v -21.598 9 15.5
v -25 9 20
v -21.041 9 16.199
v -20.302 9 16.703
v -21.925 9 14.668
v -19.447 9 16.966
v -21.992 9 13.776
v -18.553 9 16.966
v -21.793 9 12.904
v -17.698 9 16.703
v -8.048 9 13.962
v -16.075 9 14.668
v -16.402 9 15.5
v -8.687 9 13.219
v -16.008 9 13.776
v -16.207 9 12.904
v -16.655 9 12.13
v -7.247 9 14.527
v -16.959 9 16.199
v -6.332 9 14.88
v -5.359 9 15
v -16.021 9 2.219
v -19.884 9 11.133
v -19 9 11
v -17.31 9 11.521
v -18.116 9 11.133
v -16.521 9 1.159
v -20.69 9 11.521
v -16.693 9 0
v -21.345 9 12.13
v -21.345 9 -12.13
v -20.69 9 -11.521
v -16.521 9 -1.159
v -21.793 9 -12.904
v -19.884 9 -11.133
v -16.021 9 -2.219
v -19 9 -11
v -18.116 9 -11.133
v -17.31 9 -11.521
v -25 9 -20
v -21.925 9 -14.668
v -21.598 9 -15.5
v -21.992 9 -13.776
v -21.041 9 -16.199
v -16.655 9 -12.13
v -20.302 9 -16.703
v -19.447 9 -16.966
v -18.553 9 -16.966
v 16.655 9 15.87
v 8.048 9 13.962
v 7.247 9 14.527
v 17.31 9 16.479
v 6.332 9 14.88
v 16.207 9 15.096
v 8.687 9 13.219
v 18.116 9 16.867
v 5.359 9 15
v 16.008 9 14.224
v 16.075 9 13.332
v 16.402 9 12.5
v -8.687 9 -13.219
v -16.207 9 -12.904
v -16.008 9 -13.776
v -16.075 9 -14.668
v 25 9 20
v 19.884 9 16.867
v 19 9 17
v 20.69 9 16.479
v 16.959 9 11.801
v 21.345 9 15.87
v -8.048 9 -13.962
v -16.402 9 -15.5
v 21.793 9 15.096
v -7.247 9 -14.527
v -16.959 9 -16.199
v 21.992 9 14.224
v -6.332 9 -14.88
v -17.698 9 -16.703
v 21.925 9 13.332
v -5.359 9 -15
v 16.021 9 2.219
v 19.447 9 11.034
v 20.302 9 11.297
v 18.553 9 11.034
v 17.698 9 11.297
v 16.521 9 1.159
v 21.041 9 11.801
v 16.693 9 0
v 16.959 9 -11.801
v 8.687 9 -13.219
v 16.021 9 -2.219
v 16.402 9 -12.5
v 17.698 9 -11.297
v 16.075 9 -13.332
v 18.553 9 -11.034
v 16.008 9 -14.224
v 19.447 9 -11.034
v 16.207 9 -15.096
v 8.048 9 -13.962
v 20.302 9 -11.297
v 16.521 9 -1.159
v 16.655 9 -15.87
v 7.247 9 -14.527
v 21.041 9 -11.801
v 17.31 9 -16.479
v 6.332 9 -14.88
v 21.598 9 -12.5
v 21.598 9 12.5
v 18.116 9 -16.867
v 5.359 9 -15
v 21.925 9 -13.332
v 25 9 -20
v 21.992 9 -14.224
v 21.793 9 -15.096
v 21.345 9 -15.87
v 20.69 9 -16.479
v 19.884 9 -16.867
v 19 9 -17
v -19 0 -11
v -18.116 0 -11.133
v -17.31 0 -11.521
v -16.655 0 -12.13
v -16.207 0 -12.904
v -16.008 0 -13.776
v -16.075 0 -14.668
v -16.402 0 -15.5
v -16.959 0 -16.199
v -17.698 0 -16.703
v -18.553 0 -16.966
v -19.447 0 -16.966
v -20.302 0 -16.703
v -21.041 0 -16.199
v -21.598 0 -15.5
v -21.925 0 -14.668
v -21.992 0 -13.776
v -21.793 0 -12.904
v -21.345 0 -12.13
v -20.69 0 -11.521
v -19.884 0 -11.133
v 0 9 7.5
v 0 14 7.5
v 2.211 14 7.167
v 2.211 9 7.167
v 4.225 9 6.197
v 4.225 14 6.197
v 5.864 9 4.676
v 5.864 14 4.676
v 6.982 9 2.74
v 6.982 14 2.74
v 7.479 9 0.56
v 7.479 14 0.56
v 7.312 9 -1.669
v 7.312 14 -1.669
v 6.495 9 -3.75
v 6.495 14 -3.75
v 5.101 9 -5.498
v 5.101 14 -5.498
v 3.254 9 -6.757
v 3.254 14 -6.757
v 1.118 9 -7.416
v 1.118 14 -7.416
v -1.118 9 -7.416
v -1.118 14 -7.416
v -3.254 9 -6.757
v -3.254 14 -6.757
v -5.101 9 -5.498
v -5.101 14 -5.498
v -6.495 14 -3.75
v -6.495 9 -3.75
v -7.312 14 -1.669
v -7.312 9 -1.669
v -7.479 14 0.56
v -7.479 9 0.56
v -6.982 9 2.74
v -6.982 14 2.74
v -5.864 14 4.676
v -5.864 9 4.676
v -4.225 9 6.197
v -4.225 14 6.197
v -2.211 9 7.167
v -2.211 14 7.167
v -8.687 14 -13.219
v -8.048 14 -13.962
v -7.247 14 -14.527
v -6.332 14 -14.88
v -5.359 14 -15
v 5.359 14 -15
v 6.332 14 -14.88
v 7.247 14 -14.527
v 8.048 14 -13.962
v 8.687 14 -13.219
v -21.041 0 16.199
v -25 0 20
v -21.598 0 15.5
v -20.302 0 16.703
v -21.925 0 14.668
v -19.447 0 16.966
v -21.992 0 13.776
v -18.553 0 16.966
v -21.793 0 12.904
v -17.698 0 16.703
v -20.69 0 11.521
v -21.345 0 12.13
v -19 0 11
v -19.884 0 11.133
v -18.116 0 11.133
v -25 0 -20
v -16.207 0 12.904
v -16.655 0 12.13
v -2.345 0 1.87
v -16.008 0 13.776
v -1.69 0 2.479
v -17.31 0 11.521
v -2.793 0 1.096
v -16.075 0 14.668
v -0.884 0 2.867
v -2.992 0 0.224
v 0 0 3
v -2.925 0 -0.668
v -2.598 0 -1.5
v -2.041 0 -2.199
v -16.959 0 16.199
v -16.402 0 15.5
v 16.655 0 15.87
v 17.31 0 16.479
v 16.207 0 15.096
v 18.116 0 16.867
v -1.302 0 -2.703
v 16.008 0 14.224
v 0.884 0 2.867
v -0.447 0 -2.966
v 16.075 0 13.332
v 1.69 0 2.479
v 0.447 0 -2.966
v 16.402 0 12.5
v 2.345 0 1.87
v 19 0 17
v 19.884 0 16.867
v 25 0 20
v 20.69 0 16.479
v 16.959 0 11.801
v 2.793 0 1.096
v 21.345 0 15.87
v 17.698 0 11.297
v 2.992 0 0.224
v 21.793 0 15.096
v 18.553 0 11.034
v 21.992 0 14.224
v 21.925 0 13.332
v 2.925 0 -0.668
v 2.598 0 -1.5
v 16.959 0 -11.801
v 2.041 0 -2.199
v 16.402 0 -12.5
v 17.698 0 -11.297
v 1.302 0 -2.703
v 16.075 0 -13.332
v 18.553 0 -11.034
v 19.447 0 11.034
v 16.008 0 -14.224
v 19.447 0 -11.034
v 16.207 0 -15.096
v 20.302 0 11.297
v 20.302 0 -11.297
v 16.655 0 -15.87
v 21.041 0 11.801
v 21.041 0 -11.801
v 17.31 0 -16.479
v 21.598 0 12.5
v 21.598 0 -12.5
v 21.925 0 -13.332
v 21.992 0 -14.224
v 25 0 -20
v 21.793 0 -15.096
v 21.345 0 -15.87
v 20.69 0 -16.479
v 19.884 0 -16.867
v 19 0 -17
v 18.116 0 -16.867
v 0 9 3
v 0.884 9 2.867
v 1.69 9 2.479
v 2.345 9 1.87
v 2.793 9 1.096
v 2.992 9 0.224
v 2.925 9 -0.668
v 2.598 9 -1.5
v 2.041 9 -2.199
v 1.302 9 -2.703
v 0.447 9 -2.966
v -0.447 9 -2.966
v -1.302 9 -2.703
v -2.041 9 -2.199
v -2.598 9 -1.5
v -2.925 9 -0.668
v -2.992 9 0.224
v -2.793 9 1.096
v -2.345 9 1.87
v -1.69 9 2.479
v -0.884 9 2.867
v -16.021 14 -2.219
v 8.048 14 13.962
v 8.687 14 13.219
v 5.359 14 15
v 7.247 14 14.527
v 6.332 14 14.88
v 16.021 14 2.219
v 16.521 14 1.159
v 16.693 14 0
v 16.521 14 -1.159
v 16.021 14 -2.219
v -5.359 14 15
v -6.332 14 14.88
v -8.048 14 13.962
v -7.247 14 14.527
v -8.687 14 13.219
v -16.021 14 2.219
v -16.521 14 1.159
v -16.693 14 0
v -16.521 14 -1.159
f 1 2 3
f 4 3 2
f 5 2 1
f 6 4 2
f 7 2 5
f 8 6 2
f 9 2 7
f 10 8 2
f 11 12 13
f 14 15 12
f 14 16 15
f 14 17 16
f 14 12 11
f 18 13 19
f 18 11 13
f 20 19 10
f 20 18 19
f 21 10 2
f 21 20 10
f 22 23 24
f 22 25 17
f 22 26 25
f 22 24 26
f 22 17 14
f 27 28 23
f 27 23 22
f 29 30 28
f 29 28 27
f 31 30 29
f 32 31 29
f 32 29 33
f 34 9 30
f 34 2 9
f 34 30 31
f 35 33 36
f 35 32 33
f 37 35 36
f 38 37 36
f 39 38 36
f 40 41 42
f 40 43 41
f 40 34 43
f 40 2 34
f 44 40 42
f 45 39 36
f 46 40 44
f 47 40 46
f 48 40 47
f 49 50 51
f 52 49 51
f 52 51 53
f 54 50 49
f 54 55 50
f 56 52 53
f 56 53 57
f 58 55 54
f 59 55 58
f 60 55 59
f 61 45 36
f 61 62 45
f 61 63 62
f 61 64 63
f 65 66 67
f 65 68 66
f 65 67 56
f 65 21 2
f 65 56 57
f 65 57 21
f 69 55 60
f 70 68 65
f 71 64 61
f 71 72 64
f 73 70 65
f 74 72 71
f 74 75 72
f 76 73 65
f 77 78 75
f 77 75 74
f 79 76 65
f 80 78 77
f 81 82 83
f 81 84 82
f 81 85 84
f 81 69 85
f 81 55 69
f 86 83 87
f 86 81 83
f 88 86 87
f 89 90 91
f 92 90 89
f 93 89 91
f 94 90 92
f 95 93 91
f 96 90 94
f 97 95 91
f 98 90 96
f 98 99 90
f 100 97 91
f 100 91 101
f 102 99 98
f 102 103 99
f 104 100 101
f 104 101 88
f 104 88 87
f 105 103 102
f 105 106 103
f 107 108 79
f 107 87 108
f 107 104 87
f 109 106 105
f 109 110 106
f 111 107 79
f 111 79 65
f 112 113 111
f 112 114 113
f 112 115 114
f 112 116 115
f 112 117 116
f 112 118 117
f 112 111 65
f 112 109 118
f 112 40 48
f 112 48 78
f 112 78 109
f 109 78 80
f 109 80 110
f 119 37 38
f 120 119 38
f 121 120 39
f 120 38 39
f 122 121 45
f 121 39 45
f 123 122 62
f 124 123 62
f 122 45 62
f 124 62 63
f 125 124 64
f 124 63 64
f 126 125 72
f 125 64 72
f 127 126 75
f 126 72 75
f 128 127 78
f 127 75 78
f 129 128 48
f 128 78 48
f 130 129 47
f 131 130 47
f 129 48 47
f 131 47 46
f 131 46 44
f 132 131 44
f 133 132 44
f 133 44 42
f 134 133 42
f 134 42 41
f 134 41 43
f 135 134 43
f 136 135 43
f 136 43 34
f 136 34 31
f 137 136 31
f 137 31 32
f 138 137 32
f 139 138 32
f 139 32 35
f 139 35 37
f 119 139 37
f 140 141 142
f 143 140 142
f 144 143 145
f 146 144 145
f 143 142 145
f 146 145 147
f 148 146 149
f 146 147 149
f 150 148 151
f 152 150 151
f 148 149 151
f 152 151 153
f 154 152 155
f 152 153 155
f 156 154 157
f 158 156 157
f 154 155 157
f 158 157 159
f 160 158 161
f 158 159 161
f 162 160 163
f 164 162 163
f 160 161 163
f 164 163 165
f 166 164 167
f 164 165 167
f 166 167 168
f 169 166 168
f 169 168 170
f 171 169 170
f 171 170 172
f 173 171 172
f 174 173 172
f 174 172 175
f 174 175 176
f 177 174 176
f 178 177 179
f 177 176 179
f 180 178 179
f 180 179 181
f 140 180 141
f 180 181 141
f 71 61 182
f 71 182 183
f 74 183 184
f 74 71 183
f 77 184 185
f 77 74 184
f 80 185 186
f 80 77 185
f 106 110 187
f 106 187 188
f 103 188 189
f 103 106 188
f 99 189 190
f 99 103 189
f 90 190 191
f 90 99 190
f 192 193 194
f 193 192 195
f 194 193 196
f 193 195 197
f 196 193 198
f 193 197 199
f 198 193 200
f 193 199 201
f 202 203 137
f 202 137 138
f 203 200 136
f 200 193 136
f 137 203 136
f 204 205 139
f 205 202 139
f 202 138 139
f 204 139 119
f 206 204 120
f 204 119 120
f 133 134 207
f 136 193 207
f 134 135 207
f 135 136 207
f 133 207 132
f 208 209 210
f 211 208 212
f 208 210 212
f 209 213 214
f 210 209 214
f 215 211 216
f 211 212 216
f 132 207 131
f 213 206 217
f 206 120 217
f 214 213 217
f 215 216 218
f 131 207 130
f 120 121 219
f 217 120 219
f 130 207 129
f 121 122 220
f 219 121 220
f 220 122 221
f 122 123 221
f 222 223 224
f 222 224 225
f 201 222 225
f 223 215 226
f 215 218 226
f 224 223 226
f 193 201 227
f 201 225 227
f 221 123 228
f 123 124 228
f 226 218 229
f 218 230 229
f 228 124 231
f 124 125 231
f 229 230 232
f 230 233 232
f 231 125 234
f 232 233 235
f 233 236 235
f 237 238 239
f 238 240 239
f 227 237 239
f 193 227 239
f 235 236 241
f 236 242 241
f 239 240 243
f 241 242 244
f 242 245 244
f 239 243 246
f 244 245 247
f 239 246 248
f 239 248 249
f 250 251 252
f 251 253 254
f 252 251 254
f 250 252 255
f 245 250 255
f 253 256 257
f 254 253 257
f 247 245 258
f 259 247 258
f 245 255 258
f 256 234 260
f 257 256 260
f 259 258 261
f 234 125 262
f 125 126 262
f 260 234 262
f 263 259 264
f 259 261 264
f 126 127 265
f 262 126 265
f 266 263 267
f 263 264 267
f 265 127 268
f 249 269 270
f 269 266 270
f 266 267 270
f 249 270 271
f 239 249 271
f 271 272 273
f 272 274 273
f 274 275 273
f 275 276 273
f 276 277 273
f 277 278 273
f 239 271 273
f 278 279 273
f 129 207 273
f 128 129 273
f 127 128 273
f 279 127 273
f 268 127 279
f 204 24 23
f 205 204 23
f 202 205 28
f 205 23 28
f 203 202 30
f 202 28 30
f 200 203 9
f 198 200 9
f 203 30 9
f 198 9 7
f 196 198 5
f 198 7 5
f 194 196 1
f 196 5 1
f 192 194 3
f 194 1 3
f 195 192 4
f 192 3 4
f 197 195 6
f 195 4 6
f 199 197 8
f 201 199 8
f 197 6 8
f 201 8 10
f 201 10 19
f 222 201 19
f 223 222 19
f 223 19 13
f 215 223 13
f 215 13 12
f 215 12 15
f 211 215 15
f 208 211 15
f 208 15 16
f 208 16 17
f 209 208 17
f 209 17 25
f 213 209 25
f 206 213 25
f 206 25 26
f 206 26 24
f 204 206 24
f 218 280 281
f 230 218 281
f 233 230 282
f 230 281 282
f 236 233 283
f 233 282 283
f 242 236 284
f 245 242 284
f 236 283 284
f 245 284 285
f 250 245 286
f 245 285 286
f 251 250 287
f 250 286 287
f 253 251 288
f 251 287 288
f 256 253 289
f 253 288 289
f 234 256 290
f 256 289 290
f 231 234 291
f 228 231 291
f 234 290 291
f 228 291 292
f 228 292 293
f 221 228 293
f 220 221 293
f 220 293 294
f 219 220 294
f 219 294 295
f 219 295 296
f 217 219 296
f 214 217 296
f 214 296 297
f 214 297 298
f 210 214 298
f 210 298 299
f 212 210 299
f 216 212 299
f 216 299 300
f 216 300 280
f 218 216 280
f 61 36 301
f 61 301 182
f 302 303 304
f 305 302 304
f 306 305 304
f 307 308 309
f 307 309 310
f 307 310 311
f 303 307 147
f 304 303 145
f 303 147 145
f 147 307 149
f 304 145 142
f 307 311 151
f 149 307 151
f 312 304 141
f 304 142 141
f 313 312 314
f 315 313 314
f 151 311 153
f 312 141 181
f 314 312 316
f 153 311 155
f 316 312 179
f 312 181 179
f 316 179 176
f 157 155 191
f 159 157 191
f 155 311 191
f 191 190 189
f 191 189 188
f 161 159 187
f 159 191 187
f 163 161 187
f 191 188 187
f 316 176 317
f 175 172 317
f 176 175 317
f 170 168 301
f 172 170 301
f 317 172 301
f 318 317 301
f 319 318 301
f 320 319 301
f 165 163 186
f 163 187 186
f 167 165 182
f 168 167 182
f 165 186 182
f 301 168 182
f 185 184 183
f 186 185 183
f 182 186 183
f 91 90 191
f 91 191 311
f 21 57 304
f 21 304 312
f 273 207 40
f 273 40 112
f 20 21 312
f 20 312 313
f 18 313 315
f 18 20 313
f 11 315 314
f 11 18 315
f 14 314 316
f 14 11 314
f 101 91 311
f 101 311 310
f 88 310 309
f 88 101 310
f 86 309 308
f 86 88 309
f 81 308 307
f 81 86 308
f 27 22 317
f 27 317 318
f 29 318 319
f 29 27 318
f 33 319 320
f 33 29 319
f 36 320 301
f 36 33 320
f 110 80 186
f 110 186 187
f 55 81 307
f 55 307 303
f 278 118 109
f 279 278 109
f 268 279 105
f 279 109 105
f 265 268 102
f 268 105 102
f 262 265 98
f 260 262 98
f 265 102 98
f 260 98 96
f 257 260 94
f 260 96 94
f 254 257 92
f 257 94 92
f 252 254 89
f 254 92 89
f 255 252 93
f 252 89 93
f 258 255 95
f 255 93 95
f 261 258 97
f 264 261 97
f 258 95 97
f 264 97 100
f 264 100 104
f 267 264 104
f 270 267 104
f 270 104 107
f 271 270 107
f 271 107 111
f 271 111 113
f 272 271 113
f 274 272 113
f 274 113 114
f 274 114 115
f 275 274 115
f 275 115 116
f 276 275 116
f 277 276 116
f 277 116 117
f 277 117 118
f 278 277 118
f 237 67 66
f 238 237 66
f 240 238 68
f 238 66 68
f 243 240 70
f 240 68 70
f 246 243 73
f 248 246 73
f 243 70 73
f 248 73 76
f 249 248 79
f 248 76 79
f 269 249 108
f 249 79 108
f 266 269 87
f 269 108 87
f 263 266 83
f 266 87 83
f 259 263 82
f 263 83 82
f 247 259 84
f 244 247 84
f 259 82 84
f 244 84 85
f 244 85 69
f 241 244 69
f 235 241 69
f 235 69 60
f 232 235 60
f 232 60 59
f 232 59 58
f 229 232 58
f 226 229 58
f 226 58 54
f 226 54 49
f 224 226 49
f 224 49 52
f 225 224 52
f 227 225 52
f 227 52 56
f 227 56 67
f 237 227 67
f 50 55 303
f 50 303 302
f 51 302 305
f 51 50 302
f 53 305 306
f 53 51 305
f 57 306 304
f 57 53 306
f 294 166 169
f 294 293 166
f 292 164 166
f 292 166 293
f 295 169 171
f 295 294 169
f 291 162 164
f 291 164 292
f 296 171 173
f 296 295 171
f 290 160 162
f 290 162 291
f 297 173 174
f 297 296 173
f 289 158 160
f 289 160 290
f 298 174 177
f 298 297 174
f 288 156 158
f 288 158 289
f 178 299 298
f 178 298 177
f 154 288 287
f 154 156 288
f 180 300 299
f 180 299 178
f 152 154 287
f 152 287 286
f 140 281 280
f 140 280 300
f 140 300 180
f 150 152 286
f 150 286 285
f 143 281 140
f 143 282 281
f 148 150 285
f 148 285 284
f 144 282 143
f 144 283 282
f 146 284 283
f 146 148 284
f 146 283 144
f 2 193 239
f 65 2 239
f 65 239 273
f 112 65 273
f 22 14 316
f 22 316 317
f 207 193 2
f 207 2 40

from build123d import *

# Parameters (mm, degrees)
SKETCH_2_W           = 50
SKETCH_2_H           = 40
EXTRUDE_1_DEPTH      = 9
EXTRUDE_3_DEPTH      = 5
SKETCH_6_R           = 7.5
CUT_EXTRUDE_1_DEPTH  = 5
SKETCH_7_R           = 3
CUT_EXTRUDE_2_DEPTH  = 34.256578297
CUT_EXTRUDE_START    = -5
CUT_EXTRUDE_11_DEPTH = 5
SKETCH_16_R          = 3
CUT_EXTRUDE_12_DEPTH = 34.256578297


with BuildPart() as part:
    # 草图2 → 凸台-拉伸1 (new body)
    with BuildSketch(Plane(origin=(0, 0, 0), x_dir=(1, 0, 0), z_dir=(0, 1, 0))):
        Rectangle(SKETCH_2_W, SKETCH_2_H)
    extrude(amount=EXTRUDE_1_DEPTH)

    # 草图3 → 凸台-拉伸3 (add)
    with BuildSketch(Plane(origin=(0, 9, 0), x_dir=(1, 0, 0), z_dir=(0, 1, 0))):
        with BuildLine():
            Line((13.5, -15), (-13.5, -15))
            ThreePointArc((-13.5, -15), (-16.328427125, -13.828427125), (-17.5, -11))
            Line((-17.5, -11), (-17.5, 11))
            ThreePointArc((-17.5, 11), (-16.328427125, 13.828427125), (-13.5, 15))
            Line((-13.5, 15), (13.5, 15))
            ThreePointArc((13.5, 15), (16.328427125, 13.828427125), (17.5, 11))
            Line((17.5, 11), (17.5, -11))
            ThreePointArc((17.5, -11), (16.328427125, -13.828427125), (13.5, -15))
        make_face()
    extrude(amount=EXTRUDE_3_DEPTH)

    # 草图6 → 切除-拉伸1 (cut)
    with BuildSketch(Plane(origin=(0, 14, 0), x_dir=(1, 0, 0), z_dir=(0, 1, 0))):
        with Locations(Location((0, 0, 0), (0, 0, 270))):
            Circle(SKETCH_6_R)
    extrude(amount=-CUT_EXTRUDE_1_DEPTH, mode=Mode.SUBTRACT)

    # 草图7 → 切除-拉伸2 (cut, through all)
    with BuildSketch(Plane(origin=(0, 9, 0), x_dir=(1, 0, 0), z_dir=(0, 1, 0))):
        with Locations(Location((0, 0, 0), (0, 0, 270))):
            Circle(SKETCH_7_R)
    extrude(amount=-CUT_EXTRUDE_2_DEPTH, mode=Mode.SUBTRACT)

    # 草图8 → 切除-拉伸11 (cut)
    with BuildSketch(Plane(origin=(0, 14, 0), x_dir=(1, 0, 0), z_dir=(0, 1, 0)).offset(CUT_EXTRUDE_START)):
        with BuildLine():
            ThreePointArc((-8.687466143, 13.218800785), (-7.246696668, 14.526698395), (-5.359264966, 15))
            Line((-5.359264966, 15), (-13.5, 15))
            ThreePointArc((-13.5, 15), (-16.328427125, 13.828427125), (-17.5, 11))
            Line((-17.5, 11), (-17.5, -11))
            ThreePointArc((-17.5, -11), (-16.328427125, -13.828427125), (-13.5, -15))
            Line((-13.5, -15), (-5.359264966, -15))
            ThreePointArc((-5.359264966, -15), (-7.246696668, -14.526698395), (-8.687466143, -13.218800785))
            Line((-8.687466143, -13.218800785), (-16.020799477, -2.218800785))
            ThreePointArc((-16.020799477, -2.218800785), (-16.692598299, 0), (-16.020799477, 2.218800785))
            Line((-16.020799477, 2.218800785), (-8.687466143, 13.218800785))
        make_face()
        with BuildLine():
            ThreePointArc((5.359264966, 15), (7.246696668, 14.526698395), (8.687466143, 13.218800785))
            Line((8.687466143, 13.218800785), (16.020799477, 2.218800785))
            ThreePointArc((16.020799477, 2.218800785), (16.692598299, 0), (16.020799477, -2.218800785))
            Line((16.020799477, -2.218800785), (8.687466143, -13.218800785))
            ThreePointArc((8.687466143, -13.218800785), (7.246696668, -14.526698395), (5.359264966, -15))
            Line((5.359264966, -15), (13.5, -15))
            ThreePointArc((13.5, -15), (16.328427125, -13.828427125), (17.5, -11))
            Line((17.5, -11), (17.5, 11))
            ThreePointArc((17.5, 11), (16.328427125, 13.828427125), (13.5, 15))
            Line((13.5, 15), (5.359264966, 15))
        make_face()
    extrude(amount=CUT_EXTRUDE_11_DEPTH, mode=Mode.SUBTRACT)

    # 草图16 → 切除-拉伸12 (cut, through all)
    with BuildSketch(Plane(origin=(0, 9, 0), x_dir=(1, 0, 0), z_dir=(0, 1, 0))):
        with Locations(Location((-19, 14, 0), (0, 0, 270))):
            Circle(SKETCH_16_R)
        with Locations(Location((-19, -14, 0), (0, 0, 90))):
            Circle(SKETCH_16_R)
        with Locations(Location((19, -14, 0), (0, 0, 270))):
            Circle(SKETCH_16_R)
        with Locations(Location((19, 14, 0), (0, 0, 90))):
            Circle(SKETCH_16_R)
    extrude(amount=-CUT_EXTRUDE_12_DEPTH, mode=Mode.SUBTRACT)


solid = part.part
